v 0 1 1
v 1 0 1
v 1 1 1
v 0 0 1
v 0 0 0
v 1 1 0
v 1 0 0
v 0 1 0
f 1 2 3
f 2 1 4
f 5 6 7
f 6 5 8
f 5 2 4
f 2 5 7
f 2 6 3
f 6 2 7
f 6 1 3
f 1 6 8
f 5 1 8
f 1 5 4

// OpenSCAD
module thing() {
    sphere(2);
}

leftover_size = 1;
cube(leftover_size);
